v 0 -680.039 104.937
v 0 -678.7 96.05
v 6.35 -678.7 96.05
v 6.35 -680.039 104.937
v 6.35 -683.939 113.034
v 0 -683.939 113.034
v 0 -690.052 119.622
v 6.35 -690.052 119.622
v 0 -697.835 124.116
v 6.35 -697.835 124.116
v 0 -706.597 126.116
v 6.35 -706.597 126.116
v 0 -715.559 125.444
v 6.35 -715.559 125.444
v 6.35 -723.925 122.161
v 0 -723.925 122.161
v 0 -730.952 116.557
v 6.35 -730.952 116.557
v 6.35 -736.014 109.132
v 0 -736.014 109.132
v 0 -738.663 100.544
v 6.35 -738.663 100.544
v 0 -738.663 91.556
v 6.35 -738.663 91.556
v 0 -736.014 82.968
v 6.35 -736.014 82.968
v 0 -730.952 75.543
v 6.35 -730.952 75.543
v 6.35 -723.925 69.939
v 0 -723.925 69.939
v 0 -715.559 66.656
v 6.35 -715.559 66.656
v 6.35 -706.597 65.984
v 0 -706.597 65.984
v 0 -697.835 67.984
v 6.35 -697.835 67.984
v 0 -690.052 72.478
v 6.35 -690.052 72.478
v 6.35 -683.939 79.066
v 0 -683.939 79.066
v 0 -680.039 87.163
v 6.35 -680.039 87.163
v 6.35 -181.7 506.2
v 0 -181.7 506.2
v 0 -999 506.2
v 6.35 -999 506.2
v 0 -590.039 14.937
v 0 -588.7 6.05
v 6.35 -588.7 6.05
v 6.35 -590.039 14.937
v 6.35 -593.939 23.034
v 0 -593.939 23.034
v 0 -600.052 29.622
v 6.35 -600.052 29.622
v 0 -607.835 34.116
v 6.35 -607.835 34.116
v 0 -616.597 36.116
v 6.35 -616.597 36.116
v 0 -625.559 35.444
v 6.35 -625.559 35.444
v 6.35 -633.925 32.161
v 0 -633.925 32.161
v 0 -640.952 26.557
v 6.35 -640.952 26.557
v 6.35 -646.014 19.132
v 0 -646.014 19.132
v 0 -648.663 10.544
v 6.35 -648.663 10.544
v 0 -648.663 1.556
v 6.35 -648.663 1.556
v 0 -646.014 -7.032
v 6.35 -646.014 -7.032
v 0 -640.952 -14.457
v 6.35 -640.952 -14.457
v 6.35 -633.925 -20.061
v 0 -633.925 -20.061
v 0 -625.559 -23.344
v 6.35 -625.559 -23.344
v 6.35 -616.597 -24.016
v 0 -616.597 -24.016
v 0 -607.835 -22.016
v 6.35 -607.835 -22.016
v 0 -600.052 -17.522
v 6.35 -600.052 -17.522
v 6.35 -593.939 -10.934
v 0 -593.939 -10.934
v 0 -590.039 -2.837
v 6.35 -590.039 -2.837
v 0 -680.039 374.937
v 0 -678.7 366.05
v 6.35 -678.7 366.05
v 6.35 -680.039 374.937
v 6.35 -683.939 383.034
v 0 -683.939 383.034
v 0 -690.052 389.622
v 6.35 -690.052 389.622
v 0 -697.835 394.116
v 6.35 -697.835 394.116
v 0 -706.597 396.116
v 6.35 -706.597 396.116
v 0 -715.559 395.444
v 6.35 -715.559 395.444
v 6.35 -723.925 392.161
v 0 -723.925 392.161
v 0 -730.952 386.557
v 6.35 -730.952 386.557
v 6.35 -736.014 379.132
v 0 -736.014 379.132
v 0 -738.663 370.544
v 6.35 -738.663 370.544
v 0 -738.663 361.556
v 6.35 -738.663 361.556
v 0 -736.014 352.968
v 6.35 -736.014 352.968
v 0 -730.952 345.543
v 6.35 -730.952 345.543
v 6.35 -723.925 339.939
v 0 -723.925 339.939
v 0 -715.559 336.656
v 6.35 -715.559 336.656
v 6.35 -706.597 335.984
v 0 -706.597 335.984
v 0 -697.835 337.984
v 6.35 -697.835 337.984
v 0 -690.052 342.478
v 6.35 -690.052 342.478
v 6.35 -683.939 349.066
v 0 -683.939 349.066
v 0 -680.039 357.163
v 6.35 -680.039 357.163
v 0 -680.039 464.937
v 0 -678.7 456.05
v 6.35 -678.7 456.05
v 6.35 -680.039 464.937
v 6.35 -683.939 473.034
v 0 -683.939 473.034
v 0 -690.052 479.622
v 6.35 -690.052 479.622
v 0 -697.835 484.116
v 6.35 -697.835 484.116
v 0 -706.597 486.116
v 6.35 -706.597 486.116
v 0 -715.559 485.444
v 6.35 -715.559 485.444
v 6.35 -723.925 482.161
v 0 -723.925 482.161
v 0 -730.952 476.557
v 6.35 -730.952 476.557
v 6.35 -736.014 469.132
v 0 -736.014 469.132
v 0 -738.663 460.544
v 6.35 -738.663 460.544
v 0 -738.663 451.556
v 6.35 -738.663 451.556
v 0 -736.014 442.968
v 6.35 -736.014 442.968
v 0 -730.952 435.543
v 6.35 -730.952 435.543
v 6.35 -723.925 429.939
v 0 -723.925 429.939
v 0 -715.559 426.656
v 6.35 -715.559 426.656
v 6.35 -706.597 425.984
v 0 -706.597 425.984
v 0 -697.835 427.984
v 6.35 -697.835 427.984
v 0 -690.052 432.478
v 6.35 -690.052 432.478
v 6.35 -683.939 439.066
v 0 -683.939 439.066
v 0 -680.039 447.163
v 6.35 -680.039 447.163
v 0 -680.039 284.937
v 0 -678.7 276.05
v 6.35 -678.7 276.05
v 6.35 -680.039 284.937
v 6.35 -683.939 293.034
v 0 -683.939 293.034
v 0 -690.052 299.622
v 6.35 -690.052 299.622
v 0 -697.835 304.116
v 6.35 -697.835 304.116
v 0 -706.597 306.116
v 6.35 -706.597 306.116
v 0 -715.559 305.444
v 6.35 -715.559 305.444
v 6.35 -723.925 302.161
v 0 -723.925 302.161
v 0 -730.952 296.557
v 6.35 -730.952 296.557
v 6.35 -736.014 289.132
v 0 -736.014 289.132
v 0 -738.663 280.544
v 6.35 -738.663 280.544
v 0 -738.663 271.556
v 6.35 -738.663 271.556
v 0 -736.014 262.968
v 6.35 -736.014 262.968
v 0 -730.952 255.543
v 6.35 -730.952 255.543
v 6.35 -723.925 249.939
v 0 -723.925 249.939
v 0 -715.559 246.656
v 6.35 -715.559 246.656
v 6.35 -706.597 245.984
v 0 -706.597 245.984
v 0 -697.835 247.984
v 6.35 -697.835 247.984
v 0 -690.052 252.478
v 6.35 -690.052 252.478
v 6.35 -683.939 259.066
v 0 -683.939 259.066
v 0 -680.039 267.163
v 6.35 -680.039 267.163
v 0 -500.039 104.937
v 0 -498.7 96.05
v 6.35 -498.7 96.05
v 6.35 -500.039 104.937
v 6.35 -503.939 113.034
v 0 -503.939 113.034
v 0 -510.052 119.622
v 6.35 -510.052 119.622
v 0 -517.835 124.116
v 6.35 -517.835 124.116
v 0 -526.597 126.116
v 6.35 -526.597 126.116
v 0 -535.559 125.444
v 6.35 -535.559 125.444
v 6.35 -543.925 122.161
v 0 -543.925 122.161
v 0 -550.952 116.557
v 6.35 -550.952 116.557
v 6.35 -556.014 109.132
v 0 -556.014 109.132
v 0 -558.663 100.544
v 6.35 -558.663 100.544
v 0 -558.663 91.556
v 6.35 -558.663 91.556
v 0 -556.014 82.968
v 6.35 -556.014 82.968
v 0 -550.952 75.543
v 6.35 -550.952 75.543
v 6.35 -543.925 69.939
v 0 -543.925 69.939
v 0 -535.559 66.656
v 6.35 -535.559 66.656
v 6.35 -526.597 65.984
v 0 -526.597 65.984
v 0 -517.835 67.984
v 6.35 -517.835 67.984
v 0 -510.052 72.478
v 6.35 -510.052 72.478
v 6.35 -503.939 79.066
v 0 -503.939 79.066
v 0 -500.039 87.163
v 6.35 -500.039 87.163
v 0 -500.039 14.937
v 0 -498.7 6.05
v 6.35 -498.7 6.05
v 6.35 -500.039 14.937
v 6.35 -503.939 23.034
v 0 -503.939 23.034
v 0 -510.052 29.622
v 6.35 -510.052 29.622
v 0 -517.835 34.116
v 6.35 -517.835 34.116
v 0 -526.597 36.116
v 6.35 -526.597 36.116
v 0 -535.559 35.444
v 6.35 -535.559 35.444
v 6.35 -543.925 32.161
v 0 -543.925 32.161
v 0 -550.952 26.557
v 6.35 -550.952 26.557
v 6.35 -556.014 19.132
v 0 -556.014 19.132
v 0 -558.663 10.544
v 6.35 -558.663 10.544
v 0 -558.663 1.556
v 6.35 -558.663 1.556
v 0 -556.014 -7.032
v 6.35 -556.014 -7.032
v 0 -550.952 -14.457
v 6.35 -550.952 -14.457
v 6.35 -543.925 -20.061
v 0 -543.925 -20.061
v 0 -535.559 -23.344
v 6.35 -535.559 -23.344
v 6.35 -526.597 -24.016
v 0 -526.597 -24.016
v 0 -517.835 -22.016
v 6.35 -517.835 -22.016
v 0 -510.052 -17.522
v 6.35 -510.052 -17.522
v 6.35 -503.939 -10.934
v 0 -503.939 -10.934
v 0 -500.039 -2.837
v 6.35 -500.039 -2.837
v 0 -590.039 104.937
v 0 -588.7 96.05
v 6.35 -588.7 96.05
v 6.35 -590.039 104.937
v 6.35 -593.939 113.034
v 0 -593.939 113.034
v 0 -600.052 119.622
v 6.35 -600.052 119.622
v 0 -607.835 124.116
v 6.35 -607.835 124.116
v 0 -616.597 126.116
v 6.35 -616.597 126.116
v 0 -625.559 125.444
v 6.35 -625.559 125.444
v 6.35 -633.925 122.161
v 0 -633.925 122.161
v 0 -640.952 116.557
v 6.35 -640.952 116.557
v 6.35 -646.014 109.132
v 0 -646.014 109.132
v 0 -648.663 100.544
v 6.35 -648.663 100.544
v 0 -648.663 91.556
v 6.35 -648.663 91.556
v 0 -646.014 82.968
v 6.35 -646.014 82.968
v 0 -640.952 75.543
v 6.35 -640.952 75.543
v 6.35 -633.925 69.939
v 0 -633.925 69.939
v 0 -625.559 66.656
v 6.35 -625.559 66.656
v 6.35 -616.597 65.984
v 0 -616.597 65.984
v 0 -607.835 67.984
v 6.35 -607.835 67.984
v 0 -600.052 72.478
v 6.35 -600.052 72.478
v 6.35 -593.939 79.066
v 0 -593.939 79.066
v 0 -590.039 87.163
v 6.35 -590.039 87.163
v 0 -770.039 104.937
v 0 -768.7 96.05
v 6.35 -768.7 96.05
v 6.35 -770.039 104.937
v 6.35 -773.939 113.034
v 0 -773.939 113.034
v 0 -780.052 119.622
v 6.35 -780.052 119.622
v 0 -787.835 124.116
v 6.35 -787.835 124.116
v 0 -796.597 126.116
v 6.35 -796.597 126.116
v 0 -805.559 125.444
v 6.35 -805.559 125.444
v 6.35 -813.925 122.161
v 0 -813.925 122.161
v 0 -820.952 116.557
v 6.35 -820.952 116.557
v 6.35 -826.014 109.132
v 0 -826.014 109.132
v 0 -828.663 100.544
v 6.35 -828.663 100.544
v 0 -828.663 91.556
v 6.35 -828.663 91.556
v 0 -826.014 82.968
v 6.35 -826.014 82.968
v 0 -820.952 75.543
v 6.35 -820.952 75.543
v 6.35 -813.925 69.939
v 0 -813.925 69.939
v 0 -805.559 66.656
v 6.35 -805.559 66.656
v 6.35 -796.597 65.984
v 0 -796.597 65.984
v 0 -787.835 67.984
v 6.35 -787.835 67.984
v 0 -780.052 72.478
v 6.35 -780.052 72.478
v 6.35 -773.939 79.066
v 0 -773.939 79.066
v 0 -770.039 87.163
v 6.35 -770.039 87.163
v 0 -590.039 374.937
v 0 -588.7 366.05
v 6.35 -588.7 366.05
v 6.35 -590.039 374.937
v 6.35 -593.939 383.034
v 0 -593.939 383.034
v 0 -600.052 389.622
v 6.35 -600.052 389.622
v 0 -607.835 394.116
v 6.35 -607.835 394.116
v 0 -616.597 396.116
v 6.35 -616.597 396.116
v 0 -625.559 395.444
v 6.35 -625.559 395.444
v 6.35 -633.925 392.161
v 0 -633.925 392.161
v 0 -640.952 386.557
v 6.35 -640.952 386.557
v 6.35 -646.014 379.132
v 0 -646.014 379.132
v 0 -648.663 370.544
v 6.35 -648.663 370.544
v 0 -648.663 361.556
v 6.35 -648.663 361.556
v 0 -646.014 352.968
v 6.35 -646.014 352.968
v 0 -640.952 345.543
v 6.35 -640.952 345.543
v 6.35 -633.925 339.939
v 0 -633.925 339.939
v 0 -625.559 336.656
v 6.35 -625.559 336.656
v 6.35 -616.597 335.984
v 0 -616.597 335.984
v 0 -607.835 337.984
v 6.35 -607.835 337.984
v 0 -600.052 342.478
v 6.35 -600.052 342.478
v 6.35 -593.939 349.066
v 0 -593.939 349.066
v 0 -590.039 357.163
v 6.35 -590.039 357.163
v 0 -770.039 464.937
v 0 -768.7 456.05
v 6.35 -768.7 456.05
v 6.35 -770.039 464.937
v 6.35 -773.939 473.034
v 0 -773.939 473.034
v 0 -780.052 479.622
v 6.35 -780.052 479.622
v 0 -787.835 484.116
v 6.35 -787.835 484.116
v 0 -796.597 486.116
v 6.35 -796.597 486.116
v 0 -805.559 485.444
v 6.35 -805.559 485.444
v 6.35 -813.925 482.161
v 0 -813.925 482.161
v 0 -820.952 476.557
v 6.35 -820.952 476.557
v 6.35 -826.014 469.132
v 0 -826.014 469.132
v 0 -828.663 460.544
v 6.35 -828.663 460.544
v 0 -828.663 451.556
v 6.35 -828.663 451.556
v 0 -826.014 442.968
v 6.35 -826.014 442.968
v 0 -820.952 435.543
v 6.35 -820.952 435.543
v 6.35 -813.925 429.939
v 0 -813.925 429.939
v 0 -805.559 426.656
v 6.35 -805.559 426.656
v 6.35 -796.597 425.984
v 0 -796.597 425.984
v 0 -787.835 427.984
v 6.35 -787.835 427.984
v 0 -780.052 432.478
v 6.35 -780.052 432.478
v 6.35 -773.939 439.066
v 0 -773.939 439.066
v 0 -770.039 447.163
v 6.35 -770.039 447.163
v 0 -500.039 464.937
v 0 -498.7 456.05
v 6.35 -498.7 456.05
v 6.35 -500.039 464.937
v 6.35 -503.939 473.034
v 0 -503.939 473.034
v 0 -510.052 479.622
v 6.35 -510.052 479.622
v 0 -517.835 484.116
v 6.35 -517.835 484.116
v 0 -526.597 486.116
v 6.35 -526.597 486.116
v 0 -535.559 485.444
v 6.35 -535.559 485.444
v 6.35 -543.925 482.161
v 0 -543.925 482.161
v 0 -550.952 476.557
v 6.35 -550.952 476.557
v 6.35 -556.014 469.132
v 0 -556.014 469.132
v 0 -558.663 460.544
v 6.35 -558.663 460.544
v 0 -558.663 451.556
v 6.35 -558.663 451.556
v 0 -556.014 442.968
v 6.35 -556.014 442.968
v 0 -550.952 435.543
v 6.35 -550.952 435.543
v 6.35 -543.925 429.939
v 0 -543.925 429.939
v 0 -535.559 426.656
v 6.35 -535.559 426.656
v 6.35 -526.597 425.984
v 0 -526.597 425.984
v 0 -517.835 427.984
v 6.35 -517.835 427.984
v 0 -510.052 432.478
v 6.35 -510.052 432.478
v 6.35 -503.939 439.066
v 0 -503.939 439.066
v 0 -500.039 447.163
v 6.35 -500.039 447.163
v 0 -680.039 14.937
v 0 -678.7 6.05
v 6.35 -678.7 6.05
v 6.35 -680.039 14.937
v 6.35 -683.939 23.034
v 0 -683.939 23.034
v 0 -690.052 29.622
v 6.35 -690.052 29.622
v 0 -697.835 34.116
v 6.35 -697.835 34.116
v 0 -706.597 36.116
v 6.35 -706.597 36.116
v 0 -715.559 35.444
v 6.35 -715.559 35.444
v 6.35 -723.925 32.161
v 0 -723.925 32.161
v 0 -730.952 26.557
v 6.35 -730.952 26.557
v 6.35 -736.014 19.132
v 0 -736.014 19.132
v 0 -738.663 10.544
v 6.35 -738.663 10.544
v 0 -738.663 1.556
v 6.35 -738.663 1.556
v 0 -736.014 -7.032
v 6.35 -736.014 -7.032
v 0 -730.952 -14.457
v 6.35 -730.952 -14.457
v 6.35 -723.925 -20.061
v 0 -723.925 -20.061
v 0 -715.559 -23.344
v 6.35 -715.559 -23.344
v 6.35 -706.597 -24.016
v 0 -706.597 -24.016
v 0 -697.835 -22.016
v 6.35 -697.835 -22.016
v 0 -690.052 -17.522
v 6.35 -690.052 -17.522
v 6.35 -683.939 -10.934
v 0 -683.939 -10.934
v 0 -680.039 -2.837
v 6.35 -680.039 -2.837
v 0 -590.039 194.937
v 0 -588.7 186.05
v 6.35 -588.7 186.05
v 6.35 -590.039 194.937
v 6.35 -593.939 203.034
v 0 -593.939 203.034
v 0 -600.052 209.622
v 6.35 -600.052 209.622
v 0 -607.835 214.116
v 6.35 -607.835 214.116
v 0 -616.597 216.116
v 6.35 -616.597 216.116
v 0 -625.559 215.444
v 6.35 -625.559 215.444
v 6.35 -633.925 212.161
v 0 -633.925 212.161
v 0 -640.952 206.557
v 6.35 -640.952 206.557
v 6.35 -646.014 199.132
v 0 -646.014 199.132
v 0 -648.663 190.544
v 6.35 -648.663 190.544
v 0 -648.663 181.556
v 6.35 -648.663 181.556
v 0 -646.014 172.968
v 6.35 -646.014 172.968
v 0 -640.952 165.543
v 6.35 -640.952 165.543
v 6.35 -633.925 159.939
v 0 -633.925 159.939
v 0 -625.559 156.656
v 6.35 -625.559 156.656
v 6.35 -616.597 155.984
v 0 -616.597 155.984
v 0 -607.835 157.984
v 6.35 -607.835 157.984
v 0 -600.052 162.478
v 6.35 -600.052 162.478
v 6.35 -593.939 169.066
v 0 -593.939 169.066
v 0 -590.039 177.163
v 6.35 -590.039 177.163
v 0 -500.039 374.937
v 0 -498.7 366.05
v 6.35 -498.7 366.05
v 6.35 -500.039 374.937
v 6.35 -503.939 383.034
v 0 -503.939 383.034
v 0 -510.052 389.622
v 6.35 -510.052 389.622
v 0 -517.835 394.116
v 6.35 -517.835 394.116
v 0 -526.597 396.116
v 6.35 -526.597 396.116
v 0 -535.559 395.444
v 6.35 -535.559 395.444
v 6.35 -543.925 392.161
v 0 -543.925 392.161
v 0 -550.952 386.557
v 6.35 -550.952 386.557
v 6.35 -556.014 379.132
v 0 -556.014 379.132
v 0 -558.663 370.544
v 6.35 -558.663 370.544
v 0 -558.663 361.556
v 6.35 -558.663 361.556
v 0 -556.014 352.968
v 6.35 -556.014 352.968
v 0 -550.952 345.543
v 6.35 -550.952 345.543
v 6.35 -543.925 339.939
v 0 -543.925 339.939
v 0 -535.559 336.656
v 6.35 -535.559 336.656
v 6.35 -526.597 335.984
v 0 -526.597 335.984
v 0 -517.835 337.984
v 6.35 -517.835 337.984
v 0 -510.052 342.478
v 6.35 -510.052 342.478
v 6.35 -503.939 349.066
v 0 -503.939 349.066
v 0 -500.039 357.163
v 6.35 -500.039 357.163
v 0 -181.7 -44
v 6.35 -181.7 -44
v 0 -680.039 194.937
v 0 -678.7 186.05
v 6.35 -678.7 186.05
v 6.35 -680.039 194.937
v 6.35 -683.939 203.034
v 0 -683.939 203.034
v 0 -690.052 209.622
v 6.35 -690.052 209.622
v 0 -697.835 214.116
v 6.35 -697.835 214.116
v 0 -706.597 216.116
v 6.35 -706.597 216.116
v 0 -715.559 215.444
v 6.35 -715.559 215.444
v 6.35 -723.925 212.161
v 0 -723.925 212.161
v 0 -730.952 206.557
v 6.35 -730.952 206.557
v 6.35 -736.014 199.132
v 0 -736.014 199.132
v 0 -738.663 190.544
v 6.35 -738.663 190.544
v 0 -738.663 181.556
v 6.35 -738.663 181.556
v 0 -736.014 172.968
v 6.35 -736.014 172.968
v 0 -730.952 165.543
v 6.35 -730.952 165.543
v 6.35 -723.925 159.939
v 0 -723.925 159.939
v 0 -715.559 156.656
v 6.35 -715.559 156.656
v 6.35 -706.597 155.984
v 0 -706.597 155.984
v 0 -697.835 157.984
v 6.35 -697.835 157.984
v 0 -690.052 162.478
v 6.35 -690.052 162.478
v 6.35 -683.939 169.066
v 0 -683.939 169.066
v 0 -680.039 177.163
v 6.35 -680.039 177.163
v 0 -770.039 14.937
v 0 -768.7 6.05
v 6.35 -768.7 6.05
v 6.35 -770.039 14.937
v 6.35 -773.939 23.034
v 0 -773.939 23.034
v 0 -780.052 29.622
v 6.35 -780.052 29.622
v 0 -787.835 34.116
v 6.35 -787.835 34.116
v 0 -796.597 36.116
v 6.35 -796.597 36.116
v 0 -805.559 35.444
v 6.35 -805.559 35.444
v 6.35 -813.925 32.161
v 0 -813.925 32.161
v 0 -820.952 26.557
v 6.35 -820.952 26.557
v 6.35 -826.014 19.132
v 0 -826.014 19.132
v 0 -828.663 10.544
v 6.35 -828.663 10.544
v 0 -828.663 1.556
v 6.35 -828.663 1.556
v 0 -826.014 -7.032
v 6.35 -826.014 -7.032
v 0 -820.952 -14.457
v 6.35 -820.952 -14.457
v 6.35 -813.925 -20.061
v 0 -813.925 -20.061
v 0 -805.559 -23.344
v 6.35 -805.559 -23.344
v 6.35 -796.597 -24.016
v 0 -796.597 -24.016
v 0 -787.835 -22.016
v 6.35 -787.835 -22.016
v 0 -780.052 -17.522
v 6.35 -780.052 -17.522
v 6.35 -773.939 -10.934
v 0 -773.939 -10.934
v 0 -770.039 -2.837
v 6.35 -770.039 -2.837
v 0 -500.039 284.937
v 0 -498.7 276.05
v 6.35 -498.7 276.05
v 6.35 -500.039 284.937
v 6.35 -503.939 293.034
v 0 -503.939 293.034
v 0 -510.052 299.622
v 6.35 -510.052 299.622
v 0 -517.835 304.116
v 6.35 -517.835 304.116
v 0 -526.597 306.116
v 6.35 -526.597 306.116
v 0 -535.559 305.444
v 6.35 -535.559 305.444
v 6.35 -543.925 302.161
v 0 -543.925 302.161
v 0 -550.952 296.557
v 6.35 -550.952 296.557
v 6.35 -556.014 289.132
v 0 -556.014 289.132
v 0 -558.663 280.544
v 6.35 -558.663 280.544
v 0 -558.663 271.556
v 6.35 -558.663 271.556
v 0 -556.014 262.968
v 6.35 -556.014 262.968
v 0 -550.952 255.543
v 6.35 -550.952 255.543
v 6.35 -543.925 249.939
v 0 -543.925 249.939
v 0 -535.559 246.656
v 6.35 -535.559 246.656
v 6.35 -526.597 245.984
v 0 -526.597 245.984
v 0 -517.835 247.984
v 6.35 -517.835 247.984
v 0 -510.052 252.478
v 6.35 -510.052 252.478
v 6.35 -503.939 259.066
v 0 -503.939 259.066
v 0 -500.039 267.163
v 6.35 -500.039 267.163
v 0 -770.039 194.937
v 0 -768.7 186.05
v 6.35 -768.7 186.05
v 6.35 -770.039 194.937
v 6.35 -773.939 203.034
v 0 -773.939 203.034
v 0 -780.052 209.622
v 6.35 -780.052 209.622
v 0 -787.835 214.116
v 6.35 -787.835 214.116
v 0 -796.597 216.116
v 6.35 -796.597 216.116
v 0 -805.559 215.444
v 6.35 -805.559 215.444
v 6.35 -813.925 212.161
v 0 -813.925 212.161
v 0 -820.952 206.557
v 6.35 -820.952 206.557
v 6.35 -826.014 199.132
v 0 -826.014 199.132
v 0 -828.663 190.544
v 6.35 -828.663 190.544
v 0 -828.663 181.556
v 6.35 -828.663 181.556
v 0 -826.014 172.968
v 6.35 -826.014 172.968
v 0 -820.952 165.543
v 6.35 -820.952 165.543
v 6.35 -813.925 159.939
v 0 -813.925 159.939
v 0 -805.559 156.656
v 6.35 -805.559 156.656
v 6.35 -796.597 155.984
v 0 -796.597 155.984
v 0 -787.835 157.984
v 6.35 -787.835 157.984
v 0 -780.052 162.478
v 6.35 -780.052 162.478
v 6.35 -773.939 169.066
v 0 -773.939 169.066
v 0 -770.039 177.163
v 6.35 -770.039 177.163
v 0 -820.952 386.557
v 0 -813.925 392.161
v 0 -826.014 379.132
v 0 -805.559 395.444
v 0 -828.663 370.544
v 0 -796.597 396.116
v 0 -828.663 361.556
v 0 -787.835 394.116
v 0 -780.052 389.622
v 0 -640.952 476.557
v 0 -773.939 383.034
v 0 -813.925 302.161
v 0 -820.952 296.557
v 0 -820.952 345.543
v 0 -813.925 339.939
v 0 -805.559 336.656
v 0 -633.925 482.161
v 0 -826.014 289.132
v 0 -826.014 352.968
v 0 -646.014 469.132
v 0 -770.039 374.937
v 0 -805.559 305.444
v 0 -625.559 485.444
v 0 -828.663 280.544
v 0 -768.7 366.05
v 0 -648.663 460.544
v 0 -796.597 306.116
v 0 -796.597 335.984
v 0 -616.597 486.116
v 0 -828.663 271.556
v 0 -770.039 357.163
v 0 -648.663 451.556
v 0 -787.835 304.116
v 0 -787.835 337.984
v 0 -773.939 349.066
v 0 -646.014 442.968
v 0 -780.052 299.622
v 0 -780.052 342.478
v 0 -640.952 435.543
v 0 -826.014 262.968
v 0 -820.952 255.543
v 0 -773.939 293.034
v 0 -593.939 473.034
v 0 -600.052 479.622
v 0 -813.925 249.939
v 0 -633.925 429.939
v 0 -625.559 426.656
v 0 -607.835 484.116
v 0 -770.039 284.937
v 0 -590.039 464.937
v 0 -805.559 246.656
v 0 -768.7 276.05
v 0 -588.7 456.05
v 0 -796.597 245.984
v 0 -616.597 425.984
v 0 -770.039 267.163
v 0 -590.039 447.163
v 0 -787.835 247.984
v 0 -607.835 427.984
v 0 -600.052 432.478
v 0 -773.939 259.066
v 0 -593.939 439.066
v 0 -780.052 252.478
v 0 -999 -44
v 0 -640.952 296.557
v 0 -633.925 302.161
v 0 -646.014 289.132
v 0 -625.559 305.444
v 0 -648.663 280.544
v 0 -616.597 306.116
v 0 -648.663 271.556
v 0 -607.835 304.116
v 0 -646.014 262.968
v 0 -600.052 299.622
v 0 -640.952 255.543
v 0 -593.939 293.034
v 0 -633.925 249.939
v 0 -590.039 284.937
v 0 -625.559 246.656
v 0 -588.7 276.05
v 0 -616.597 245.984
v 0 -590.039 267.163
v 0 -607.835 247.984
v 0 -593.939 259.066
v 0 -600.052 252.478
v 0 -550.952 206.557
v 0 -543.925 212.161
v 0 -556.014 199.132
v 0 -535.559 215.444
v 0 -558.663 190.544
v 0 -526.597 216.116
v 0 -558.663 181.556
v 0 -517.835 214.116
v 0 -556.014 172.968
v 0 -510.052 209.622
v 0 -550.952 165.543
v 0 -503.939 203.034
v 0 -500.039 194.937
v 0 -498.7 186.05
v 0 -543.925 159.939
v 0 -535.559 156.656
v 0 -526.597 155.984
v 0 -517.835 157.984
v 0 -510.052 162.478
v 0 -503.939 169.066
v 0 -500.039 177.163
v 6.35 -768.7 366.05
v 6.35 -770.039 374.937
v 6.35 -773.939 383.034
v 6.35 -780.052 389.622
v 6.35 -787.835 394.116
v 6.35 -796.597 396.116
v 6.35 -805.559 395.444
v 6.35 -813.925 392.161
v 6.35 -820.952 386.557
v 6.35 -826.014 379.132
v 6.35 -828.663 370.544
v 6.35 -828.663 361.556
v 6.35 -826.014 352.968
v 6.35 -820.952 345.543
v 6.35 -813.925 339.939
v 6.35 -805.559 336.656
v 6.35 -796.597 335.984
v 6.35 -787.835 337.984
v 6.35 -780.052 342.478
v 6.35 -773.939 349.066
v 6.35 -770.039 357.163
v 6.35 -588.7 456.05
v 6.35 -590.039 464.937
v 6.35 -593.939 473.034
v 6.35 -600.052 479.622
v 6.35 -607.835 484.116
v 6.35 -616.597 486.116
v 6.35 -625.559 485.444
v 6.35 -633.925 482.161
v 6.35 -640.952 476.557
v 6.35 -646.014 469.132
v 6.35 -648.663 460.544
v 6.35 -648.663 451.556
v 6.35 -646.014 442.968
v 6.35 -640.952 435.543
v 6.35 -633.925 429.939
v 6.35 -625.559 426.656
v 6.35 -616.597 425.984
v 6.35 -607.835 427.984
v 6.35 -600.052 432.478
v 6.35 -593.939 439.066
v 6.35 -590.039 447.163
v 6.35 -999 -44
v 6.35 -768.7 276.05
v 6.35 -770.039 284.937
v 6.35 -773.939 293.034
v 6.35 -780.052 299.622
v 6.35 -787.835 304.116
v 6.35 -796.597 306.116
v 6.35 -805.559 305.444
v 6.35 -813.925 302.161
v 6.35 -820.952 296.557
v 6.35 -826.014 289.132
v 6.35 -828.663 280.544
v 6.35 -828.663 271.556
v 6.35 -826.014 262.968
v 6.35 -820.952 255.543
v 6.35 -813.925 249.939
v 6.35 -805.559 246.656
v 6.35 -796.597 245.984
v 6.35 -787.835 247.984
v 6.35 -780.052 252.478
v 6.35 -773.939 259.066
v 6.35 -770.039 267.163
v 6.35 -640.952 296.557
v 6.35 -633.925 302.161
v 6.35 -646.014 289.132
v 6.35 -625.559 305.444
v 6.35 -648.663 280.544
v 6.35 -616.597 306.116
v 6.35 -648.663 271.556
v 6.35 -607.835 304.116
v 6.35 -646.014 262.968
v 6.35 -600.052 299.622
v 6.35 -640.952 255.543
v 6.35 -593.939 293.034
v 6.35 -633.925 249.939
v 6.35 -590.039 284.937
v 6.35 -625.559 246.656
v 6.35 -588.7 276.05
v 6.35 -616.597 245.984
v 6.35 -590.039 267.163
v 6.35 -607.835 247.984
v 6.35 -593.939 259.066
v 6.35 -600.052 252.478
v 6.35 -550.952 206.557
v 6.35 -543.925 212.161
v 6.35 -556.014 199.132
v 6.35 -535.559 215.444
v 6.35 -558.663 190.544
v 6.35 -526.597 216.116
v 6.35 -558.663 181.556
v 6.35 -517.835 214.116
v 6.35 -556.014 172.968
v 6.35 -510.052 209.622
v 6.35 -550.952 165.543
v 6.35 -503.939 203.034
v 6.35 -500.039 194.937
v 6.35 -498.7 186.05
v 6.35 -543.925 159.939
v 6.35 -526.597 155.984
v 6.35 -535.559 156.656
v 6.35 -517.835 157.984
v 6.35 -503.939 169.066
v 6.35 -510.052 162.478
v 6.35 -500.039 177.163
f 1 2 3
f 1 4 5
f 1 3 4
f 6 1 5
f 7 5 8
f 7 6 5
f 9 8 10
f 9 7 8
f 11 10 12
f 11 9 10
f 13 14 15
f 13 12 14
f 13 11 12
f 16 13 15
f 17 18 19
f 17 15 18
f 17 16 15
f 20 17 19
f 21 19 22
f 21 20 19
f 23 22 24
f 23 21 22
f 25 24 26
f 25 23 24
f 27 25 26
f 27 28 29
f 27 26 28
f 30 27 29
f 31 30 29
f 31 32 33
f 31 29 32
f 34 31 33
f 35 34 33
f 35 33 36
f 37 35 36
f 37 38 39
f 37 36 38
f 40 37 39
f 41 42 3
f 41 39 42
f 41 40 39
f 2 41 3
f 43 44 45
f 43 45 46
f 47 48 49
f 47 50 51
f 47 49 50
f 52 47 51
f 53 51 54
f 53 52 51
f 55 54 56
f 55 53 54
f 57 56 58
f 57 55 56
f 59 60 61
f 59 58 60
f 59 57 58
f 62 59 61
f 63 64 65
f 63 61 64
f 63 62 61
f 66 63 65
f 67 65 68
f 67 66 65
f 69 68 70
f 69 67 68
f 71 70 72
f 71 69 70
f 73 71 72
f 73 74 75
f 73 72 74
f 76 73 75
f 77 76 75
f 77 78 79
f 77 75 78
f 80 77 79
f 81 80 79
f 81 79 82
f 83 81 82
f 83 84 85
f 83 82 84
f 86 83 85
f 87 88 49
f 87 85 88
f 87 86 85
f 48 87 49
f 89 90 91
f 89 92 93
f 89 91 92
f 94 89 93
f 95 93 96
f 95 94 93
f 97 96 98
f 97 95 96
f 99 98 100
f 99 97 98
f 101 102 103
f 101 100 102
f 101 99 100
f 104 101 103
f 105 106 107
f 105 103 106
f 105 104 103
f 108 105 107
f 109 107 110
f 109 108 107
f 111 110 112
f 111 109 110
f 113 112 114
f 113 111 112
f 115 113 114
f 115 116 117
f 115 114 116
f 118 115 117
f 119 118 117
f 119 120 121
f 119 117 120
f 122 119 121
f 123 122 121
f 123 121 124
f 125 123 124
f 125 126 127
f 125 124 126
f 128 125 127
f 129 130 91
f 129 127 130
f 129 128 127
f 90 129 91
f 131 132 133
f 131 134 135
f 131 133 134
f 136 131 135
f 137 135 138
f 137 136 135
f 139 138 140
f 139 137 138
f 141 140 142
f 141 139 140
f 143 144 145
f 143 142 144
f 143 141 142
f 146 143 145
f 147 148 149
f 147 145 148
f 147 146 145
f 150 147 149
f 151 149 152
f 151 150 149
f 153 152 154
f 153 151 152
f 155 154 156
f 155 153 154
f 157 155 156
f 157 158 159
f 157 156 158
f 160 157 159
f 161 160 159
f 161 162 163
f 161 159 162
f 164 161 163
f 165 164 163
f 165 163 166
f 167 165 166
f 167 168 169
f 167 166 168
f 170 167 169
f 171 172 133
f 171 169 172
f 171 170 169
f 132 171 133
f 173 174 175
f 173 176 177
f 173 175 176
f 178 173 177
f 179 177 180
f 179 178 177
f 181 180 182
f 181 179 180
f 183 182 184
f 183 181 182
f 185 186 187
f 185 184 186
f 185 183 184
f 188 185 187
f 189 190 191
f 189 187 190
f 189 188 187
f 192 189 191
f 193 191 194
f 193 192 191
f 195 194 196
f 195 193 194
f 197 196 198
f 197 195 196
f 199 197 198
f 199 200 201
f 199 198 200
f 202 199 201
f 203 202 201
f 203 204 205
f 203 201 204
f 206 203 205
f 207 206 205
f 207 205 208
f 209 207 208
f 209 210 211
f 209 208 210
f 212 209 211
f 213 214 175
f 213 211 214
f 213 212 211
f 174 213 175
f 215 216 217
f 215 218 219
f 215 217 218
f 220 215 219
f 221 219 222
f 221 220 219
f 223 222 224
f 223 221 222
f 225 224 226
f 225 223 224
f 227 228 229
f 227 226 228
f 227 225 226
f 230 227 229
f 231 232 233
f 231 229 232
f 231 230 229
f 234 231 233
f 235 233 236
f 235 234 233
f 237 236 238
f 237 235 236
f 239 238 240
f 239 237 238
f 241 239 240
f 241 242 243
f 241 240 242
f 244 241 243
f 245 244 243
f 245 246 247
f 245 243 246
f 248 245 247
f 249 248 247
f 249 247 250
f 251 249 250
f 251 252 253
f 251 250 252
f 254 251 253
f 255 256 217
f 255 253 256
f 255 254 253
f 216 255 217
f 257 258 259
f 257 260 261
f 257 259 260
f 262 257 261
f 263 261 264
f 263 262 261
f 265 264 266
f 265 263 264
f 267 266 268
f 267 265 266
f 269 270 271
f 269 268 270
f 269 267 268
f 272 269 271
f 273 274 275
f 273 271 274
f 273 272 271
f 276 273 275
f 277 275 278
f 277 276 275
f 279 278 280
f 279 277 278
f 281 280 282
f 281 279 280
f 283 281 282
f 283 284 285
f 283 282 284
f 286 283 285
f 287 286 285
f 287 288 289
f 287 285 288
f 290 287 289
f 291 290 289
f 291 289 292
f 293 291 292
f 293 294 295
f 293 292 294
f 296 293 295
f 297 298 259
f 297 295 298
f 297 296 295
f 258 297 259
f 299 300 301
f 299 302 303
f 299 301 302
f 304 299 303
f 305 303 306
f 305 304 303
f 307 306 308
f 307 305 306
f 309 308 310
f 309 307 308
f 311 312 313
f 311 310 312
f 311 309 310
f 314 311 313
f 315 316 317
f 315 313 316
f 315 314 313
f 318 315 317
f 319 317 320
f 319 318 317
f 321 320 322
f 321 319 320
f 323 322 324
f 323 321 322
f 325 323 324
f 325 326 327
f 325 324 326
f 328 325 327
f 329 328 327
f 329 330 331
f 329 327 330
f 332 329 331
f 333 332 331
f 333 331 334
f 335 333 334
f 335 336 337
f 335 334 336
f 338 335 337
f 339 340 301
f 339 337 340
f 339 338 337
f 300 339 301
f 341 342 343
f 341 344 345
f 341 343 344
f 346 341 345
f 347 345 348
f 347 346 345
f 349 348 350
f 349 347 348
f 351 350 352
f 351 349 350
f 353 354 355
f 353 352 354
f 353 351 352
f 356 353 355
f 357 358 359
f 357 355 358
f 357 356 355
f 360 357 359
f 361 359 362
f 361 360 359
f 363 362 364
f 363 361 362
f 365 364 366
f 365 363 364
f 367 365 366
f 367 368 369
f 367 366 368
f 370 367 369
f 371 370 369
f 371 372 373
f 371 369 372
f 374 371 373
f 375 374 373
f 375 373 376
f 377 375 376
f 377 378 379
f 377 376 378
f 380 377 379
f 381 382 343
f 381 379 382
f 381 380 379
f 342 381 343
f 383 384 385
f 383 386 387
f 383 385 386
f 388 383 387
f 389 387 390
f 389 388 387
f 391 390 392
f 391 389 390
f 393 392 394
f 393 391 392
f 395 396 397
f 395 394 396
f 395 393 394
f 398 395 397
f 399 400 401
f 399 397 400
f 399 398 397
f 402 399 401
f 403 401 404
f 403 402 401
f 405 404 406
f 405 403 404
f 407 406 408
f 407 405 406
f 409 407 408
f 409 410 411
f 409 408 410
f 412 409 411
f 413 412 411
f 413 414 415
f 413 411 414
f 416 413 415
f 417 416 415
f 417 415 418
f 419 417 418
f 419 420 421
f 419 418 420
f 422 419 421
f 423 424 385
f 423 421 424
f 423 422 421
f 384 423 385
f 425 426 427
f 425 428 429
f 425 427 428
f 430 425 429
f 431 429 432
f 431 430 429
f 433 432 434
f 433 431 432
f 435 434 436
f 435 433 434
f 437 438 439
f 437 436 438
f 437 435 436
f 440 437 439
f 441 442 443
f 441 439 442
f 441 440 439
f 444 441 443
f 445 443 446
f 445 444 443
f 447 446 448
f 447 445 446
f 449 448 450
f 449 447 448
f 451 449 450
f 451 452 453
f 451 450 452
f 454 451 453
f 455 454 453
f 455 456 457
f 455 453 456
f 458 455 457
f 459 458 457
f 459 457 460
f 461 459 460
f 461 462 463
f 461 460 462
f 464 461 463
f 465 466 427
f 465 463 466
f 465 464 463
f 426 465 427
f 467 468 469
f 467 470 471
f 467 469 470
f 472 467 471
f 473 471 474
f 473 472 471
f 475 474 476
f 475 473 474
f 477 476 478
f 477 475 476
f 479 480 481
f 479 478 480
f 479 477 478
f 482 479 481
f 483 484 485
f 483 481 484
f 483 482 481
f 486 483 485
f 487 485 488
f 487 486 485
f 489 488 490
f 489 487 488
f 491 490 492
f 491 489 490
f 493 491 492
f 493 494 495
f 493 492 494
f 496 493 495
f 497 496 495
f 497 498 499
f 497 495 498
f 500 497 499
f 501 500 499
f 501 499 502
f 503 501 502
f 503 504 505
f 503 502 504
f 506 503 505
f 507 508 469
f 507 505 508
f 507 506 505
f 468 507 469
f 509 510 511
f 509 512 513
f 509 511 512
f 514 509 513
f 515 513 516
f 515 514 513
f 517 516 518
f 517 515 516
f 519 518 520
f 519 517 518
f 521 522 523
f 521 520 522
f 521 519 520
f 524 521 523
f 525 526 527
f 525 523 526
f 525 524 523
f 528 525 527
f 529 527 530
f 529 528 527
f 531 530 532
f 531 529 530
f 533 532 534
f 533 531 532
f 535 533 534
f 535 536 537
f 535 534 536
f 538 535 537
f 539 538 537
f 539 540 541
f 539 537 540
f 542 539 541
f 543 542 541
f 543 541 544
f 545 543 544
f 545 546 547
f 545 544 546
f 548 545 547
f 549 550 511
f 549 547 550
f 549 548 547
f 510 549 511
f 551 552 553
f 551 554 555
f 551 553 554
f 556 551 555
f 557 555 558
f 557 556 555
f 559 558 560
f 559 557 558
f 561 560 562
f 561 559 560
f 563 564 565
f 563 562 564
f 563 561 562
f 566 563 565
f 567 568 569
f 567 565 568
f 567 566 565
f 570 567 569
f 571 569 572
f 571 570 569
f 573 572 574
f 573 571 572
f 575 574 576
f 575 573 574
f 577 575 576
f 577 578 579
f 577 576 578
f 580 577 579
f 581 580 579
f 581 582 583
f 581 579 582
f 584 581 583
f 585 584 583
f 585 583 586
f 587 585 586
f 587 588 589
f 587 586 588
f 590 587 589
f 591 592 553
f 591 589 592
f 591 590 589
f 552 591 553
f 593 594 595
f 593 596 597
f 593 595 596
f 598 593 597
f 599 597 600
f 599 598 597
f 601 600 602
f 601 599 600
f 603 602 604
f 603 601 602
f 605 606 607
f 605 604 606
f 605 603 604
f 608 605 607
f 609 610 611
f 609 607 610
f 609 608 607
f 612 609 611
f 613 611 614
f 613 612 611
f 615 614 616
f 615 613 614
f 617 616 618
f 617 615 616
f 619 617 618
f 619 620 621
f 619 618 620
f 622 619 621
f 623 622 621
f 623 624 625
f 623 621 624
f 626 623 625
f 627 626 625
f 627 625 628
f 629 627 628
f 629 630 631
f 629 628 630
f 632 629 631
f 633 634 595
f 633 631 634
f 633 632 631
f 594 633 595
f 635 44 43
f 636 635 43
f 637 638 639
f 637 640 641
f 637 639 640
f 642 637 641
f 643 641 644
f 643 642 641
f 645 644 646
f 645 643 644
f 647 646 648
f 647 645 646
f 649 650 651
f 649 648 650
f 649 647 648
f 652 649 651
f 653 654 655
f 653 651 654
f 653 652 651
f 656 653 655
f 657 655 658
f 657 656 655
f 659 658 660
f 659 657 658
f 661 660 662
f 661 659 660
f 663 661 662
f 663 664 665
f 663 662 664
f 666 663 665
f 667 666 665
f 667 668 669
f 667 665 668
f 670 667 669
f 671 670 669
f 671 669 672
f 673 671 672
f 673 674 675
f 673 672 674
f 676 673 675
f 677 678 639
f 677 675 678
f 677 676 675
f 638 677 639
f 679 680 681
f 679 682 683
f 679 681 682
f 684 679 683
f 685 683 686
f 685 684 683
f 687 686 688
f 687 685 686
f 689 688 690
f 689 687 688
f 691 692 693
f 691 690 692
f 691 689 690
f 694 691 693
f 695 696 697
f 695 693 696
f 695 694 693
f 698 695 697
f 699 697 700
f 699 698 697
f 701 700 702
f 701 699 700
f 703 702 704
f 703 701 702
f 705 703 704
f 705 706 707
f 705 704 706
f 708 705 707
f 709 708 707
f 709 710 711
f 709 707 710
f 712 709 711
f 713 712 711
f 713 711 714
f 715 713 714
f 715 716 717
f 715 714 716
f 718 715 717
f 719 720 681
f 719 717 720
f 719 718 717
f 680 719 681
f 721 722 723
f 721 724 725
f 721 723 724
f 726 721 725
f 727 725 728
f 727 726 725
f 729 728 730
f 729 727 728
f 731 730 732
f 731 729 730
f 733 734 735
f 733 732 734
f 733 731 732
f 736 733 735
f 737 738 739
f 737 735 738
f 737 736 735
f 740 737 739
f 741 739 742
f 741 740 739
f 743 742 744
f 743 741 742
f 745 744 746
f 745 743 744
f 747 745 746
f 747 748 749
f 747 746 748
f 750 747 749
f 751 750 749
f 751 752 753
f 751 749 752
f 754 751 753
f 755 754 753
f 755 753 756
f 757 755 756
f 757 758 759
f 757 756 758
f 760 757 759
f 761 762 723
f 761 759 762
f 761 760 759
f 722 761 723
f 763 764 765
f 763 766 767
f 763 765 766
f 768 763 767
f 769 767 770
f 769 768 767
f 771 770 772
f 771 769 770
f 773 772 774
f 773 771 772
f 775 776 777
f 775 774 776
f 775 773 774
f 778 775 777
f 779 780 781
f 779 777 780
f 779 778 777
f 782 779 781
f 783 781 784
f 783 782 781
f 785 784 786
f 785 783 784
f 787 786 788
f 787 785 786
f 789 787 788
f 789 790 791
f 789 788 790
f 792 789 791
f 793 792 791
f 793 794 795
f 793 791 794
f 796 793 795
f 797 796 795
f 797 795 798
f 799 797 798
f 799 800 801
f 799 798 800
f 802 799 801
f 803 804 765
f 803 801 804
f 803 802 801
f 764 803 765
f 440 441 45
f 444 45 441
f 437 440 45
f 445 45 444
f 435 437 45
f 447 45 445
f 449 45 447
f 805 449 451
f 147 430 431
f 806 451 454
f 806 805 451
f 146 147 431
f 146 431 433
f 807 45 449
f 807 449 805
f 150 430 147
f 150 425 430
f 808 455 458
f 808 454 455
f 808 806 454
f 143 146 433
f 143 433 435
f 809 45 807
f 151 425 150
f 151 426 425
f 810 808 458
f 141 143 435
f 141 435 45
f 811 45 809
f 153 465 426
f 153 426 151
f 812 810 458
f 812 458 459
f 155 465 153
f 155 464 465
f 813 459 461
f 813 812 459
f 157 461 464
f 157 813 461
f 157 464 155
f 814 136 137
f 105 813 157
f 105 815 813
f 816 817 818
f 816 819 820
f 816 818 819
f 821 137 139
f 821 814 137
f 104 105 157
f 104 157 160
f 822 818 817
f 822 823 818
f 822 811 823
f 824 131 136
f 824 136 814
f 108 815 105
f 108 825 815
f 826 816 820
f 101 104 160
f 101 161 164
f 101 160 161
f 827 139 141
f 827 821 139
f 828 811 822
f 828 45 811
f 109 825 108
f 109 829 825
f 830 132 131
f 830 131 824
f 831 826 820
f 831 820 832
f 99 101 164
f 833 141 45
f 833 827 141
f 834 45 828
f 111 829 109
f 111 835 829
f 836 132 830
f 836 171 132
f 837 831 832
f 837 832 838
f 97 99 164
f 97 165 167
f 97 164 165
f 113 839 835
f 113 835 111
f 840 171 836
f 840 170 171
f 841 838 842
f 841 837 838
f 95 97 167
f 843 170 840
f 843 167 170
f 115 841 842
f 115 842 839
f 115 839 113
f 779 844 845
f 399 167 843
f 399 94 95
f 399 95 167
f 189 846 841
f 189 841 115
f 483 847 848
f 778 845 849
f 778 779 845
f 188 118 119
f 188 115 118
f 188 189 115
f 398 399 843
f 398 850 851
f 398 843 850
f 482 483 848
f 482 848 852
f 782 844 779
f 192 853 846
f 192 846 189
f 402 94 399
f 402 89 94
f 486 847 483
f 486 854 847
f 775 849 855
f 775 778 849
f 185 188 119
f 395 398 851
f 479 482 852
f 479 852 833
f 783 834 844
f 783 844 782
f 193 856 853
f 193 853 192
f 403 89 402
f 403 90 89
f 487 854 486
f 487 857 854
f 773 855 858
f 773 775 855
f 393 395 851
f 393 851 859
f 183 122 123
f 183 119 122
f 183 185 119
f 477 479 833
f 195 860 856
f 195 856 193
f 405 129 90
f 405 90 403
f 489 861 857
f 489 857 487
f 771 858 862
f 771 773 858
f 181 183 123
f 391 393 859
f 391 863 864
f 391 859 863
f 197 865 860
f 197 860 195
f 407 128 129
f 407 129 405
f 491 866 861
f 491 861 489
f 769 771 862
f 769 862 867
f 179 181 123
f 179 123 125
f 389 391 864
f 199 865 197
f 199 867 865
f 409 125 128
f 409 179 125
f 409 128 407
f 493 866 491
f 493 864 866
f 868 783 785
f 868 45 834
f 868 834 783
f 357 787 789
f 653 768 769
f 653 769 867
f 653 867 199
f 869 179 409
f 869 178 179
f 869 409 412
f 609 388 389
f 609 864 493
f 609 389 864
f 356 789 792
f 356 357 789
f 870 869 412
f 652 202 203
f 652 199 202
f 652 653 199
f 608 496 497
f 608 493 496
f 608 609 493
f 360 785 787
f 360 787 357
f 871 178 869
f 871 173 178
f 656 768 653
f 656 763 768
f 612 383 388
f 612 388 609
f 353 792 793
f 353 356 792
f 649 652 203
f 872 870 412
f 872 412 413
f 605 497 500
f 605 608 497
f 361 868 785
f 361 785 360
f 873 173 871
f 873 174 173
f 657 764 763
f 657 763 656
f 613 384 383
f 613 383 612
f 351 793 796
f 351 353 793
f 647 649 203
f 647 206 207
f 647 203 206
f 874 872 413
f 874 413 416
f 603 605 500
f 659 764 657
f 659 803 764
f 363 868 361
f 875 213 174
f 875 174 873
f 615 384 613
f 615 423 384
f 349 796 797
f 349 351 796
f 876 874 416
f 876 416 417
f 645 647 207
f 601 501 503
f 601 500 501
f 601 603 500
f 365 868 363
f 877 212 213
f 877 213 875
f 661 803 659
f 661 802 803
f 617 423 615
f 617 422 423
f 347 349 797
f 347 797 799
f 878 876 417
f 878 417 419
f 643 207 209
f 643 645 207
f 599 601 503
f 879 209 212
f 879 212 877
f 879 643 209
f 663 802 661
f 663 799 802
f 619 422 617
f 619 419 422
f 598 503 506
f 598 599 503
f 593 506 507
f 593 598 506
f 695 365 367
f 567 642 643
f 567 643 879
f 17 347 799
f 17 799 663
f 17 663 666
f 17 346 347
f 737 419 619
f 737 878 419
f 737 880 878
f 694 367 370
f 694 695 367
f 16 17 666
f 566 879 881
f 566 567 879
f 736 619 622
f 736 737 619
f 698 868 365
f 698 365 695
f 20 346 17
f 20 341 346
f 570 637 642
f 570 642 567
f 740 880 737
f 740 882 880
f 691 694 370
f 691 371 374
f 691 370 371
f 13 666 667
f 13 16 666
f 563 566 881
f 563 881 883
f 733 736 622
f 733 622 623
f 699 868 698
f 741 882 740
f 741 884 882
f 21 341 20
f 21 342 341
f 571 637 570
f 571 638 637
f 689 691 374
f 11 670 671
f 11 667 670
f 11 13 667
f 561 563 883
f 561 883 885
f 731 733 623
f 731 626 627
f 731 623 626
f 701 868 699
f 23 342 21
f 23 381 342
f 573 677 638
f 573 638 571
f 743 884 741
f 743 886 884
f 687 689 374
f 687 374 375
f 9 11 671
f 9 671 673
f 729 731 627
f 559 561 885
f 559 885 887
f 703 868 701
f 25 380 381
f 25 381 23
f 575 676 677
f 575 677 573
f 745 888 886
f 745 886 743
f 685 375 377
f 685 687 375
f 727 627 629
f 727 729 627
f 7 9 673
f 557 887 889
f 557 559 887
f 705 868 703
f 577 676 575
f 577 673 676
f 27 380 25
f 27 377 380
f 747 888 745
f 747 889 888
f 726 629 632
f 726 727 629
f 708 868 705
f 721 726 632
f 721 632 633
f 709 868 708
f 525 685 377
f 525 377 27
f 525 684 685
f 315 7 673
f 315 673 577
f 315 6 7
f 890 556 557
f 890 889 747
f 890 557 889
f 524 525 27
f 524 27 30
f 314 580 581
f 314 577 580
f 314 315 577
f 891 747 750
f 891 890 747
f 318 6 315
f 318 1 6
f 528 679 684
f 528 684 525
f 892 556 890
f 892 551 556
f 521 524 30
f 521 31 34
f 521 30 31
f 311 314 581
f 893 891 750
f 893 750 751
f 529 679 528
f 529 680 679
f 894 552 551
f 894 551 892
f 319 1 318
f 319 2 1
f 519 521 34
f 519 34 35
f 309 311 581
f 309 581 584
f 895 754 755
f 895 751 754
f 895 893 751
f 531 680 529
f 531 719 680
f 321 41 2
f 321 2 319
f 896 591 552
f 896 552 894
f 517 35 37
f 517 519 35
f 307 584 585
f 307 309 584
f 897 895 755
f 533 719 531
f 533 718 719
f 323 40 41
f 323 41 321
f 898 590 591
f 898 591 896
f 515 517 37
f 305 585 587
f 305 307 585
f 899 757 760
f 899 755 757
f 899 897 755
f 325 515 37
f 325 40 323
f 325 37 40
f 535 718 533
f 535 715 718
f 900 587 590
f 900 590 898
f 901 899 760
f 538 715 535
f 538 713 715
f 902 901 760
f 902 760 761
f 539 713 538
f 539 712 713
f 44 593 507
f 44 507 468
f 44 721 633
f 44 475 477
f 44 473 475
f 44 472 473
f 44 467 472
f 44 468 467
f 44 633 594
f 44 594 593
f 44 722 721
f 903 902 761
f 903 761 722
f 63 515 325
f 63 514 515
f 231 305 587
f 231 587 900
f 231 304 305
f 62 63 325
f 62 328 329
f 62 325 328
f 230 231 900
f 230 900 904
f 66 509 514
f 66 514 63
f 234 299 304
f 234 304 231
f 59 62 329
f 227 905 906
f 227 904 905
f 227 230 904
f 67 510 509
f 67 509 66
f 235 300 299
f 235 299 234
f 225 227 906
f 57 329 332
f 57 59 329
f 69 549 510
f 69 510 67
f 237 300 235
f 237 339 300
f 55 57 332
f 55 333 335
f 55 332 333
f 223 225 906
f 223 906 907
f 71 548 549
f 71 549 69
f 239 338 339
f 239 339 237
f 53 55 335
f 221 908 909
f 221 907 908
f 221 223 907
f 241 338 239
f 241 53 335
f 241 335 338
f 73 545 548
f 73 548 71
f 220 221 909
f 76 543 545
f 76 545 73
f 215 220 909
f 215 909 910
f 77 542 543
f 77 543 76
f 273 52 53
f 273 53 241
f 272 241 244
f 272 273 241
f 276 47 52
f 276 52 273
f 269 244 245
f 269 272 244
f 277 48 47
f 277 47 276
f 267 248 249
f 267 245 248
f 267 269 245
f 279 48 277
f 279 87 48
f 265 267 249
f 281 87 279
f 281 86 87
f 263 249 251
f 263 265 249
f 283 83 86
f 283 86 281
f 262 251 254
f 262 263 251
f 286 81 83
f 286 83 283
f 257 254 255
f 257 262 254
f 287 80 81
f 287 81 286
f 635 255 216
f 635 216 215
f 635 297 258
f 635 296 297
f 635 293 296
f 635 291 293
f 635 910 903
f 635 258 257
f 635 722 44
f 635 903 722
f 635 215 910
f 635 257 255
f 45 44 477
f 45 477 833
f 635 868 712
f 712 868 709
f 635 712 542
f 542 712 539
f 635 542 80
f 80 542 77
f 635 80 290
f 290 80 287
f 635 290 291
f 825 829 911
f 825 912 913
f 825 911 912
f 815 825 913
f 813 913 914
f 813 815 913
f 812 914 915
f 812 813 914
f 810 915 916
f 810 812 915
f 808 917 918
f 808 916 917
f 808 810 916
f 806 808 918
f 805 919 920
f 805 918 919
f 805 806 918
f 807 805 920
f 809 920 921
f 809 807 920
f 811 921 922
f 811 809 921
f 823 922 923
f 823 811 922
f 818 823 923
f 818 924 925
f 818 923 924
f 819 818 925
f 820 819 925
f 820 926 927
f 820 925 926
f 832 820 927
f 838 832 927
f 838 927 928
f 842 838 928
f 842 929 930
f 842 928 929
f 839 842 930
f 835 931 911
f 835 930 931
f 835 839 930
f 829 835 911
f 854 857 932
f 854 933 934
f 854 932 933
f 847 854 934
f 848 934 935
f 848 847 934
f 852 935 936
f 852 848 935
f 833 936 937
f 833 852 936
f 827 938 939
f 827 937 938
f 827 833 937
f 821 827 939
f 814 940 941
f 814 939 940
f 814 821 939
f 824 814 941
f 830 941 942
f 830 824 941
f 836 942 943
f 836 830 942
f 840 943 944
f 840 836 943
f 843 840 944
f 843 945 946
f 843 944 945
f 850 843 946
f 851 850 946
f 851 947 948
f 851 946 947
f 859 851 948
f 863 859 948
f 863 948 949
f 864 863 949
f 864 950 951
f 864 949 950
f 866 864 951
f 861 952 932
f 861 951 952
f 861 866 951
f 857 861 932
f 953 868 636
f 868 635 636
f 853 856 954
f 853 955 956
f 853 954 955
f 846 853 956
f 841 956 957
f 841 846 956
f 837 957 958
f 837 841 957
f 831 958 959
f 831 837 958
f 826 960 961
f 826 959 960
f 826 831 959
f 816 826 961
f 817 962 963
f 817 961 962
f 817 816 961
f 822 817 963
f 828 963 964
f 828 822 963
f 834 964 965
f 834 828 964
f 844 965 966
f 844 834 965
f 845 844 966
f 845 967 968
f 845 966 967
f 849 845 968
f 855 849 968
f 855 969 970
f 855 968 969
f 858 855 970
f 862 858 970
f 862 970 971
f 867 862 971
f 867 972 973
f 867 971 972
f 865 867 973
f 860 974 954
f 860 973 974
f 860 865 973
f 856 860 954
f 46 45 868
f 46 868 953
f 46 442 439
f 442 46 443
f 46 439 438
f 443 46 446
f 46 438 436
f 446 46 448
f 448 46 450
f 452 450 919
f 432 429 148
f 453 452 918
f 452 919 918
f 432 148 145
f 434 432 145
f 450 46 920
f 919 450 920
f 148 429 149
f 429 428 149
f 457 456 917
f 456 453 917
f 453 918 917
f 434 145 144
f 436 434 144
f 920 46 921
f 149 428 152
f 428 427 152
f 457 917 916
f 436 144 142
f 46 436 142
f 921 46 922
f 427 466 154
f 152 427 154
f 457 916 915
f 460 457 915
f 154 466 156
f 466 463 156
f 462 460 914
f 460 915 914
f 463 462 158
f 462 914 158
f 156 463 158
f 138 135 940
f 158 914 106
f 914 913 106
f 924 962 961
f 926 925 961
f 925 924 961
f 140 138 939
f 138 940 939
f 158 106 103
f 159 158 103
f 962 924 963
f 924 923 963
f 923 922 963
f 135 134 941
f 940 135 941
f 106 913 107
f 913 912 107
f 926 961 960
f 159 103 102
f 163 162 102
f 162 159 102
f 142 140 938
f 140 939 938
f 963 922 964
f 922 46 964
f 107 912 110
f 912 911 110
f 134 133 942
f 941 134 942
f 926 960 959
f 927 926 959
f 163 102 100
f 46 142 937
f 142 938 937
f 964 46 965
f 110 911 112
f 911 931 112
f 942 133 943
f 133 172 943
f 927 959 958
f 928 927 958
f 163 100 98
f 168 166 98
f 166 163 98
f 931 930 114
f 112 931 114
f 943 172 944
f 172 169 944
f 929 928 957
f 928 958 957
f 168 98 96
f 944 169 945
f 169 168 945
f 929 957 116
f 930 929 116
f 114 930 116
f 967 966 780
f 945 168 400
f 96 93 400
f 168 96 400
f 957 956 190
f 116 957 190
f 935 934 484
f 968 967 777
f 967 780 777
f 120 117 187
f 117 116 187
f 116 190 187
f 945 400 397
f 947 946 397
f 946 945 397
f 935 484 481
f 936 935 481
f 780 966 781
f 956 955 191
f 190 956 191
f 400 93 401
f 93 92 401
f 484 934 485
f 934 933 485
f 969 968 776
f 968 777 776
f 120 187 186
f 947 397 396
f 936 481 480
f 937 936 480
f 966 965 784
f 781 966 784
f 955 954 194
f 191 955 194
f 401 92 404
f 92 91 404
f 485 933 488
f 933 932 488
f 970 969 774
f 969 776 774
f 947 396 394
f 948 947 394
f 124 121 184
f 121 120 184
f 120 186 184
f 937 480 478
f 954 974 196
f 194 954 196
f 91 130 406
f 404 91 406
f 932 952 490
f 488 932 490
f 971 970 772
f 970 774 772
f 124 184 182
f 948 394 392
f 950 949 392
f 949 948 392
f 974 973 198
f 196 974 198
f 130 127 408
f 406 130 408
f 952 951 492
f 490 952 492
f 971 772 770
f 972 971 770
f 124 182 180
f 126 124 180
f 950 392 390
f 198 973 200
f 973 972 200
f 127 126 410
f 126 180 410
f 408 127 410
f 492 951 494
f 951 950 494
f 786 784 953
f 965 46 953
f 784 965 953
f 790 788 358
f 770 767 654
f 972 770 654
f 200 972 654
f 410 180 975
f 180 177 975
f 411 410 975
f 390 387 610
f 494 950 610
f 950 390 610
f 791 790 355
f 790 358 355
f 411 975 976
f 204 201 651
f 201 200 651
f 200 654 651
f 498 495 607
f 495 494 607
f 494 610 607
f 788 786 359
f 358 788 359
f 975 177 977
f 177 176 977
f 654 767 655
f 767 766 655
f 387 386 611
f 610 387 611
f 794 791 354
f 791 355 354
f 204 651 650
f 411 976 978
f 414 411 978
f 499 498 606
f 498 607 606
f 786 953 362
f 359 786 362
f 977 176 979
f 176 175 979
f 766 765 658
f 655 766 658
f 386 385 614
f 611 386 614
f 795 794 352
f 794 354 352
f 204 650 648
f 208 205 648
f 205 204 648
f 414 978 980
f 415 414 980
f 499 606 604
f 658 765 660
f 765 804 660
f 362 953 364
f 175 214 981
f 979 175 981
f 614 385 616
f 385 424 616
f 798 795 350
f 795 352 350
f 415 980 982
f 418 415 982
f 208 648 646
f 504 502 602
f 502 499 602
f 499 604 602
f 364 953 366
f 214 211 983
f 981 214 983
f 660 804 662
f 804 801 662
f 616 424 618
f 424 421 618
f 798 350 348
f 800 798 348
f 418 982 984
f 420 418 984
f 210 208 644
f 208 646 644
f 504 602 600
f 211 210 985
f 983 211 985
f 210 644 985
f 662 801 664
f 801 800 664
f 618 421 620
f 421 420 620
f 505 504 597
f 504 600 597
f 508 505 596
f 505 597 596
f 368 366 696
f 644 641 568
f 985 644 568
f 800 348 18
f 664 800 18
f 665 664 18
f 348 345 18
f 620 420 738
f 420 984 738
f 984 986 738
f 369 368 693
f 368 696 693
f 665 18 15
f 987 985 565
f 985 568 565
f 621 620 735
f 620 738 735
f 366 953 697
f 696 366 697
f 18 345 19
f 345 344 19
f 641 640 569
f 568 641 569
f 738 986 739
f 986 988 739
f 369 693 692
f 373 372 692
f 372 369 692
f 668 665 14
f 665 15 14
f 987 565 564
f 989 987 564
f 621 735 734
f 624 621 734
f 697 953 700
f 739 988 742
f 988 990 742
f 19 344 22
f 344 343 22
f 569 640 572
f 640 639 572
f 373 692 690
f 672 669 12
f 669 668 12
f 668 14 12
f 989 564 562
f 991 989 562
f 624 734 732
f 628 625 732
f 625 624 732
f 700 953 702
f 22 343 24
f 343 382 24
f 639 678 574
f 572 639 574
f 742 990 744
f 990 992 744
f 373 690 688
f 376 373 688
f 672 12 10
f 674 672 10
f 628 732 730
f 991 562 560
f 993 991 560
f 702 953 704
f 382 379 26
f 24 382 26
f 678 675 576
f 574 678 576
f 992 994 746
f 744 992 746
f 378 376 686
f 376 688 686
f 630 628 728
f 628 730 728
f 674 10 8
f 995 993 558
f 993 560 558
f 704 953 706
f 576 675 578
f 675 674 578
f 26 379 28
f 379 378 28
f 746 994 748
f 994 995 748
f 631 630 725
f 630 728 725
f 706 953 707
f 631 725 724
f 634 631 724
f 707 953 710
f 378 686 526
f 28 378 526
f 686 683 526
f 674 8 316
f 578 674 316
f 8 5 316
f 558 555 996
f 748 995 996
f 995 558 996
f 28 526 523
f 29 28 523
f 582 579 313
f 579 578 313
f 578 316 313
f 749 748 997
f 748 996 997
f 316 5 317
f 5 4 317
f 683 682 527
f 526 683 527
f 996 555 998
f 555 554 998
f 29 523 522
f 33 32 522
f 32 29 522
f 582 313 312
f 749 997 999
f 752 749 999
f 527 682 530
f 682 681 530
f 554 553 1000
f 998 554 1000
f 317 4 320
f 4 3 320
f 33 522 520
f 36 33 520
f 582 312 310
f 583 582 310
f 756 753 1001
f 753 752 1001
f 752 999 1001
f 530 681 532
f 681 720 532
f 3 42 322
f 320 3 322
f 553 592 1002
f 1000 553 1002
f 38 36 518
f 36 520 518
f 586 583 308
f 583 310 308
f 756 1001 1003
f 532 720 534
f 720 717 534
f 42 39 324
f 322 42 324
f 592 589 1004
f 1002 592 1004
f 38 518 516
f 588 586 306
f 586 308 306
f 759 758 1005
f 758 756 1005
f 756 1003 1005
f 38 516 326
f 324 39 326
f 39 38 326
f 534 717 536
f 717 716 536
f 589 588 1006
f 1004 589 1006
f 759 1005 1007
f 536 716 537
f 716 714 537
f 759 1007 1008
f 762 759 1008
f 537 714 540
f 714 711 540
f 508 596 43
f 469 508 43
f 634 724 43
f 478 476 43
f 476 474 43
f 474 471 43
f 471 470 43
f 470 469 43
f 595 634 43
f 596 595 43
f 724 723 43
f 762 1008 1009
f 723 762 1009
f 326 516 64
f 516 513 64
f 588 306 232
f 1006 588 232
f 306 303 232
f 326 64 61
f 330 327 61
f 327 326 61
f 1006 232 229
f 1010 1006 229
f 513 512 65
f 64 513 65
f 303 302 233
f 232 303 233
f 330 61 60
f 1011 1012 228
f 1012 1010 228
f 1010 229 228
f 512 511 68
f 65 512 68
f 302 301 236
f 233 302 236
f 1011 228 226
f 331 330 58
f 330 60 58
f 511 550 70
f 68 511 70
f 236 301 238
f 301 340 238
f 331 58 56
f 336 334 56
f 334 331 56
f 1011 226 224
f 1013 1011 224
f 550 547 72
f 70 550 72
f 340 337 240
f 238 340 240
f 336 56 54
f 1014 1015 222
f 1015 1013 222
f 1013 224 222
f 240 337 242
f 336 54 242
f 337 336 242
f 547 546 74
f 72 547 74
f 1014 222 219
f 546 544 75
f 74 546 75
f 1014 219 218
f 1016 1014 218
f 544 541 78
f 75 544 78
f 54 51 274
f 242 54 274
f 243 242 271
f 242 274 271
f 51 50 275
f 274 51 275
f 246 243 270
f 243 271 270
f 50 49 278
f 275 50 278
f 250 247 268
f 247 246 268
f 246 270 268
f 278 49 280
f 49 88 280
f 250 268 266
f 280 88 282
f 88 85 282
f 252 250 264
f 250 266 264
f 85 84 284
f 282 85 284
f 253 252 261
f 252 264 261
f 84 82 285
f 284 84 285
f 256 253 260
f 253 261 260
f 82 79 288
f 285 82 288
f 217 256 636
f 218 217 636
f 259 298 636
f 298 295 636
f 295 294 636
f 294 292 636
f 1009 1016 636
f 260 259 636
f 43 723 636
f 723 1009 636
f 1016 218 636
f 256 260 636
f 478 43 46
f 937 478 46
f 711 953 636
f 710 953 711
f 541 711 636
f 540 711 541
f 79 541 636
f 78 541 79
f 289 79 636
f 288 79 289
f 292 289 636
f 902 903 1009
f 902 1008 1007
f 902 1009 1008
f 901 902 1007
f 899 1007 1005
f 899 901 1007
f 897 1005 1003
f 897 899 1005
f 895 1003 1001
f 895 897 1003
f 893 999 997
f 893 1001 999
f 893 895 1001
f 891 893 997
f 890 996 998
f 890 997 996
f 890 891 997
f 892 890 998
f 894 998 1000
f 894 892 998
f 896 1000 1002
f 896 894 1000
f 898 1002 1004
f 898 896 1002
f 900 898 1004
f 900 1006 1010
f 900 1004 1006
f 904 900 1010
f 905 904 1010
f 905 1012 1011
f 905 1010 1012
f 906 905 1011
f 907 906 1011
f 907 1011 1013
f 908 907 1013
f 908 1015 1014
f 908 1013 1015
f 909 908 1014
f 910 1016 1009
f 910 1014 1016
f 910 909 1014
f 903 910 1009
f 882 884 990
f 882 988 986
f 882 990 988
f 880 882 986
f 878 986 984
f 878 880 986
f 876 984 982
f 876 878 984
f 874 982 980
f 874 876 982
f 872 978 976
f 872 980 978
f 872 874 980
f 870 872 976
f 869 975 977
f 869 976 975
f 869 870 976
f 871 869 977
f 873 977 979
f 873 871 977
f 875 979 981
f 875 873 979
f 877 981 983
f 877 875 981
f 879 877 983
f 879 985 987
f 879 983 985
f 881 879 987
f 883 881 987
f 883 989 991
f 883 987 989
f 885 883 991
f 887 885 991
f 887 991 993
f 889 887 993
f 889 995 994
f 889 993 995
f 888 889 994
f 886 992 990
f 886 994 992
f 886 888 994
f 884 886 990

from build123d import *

# Parameters (mm, degrees)
BOX005_W         = 6.35
BOX005_H         = 150
BOX005_DEPTH     = 550.2
BOX004_W         = 6.35
BOX004_H         = 297
BOX004_DEPTH     = 550.2
SKETCH002_R      = 30.15
PAD001_DEPTH     = 200
ARRAY001_X_COUNT = 2
ARRAY001_X_PITCH = 1
ARRAY001_Y_COUNT = 4
ARRAY001_Y_PITCH = 90
ARRAY001_Z_COUNT = 6
ARRAY001_Z_PITCH = 90
BOX001_W         = 6.35
BOX001_H         = 370.3
BOX001_DEPTH     = 550.2


with BuildPart() as entrada_porta_tubos:
    # Box005 → Box005 (new body)
    with BuildSketch(Plane(origin=(0, -999, -44), x_dir=(1, 0, 0), z_dir=(0, 0, 1))):
        with Locations((3.175, 75)):
            Rectangle(BOX005_W, BOX005_H)
    extrude(amount=BOX005_DEPTH)


with BuildPart() as cubo004:
    # Box004 → Box004 (new body)
    with BuildSketch(Plane(origin=(0, -478.7, -44), x_dir=(1, 0, 0), z_dir=(0, 0, 1))):
        with Locations((3.175, 148.5)):
            Rectangle(BOX004_W, BOX004_H)
    extrude(amount=BOX004_DEPTH)


with BuildPart() as paquete_macho:
    # Sketch002 → Pad001 (new body)
    with BuildSketch(Plane.YZ):
        Circle(SKETCH002_R)
    extrude(amount=PAD001_DEPTH)


with BuildPart() as paquete_macho_1:
    # Body001 placement: moved
    add(paquete_macho.part.moved(Location((-418, 209, 0))))

    # Array001 X: paquete_macho ×2


with BuildPart() as paquete_macho_2:
    add(paquete_macho_1.part)
    with Locations(*[(i * ARRAY001_X_PITCH, 0, 0) for i in range(1, ARRAY001_X_COUNT)]):
        add(paquete_macho_1.part)

    # Array001 Y: paquete_macho ×4


with BuildPart() as paquete_macho_3:
    add(paquete_macho_2.part)
    with Locations(*[(0, i * ARRAY001_Y_PITCH, 0) for i in range(1, ARRAY001_Y_COUNT)]):
        add(paquete_macho_2.part)

    # Array001 Z: paquete_macho ×6


with BuildPart() as paquete_macho_4:
    add(paquete_macho_3.part)
    with Locations(*[(0, 0, i * ARRAY001_Z_PITCH) for i in range(1, ARRAY001_Z_COUNT)]):
        add(paquete_macho_3.part)


with BuildPart() as paquete_macho_5:
    # Array001 placement: moved
    add(paquete_macho_4.part.moved(Location((228.35, -1007.85, 6.05))))


with BuildPart() as placa_portatubo1:
    # Box001 → Box001 (new body)
    with BuildSketch(Plane(origin=(0, -849, -44), x_dir=(1, 0, 0), z_dir=(0, 0, 1))):
        with Locations((3.175, 185.15)):
            Rectangle(BOX001_W, BOX001_H)
    extrude(amount=BOX001_DEPTH)

    # Cut: cut paquete_macho
    add(paquete_macho_5.part, mode=Mode.SUBTRACT)

    # Fusion: union Cubo004
    add(cubo004.part)

    # Fusion001: union entrada_porta_tubos
    add(entrada_porta_tubos.part)


solid = placa_portatubo1.part
